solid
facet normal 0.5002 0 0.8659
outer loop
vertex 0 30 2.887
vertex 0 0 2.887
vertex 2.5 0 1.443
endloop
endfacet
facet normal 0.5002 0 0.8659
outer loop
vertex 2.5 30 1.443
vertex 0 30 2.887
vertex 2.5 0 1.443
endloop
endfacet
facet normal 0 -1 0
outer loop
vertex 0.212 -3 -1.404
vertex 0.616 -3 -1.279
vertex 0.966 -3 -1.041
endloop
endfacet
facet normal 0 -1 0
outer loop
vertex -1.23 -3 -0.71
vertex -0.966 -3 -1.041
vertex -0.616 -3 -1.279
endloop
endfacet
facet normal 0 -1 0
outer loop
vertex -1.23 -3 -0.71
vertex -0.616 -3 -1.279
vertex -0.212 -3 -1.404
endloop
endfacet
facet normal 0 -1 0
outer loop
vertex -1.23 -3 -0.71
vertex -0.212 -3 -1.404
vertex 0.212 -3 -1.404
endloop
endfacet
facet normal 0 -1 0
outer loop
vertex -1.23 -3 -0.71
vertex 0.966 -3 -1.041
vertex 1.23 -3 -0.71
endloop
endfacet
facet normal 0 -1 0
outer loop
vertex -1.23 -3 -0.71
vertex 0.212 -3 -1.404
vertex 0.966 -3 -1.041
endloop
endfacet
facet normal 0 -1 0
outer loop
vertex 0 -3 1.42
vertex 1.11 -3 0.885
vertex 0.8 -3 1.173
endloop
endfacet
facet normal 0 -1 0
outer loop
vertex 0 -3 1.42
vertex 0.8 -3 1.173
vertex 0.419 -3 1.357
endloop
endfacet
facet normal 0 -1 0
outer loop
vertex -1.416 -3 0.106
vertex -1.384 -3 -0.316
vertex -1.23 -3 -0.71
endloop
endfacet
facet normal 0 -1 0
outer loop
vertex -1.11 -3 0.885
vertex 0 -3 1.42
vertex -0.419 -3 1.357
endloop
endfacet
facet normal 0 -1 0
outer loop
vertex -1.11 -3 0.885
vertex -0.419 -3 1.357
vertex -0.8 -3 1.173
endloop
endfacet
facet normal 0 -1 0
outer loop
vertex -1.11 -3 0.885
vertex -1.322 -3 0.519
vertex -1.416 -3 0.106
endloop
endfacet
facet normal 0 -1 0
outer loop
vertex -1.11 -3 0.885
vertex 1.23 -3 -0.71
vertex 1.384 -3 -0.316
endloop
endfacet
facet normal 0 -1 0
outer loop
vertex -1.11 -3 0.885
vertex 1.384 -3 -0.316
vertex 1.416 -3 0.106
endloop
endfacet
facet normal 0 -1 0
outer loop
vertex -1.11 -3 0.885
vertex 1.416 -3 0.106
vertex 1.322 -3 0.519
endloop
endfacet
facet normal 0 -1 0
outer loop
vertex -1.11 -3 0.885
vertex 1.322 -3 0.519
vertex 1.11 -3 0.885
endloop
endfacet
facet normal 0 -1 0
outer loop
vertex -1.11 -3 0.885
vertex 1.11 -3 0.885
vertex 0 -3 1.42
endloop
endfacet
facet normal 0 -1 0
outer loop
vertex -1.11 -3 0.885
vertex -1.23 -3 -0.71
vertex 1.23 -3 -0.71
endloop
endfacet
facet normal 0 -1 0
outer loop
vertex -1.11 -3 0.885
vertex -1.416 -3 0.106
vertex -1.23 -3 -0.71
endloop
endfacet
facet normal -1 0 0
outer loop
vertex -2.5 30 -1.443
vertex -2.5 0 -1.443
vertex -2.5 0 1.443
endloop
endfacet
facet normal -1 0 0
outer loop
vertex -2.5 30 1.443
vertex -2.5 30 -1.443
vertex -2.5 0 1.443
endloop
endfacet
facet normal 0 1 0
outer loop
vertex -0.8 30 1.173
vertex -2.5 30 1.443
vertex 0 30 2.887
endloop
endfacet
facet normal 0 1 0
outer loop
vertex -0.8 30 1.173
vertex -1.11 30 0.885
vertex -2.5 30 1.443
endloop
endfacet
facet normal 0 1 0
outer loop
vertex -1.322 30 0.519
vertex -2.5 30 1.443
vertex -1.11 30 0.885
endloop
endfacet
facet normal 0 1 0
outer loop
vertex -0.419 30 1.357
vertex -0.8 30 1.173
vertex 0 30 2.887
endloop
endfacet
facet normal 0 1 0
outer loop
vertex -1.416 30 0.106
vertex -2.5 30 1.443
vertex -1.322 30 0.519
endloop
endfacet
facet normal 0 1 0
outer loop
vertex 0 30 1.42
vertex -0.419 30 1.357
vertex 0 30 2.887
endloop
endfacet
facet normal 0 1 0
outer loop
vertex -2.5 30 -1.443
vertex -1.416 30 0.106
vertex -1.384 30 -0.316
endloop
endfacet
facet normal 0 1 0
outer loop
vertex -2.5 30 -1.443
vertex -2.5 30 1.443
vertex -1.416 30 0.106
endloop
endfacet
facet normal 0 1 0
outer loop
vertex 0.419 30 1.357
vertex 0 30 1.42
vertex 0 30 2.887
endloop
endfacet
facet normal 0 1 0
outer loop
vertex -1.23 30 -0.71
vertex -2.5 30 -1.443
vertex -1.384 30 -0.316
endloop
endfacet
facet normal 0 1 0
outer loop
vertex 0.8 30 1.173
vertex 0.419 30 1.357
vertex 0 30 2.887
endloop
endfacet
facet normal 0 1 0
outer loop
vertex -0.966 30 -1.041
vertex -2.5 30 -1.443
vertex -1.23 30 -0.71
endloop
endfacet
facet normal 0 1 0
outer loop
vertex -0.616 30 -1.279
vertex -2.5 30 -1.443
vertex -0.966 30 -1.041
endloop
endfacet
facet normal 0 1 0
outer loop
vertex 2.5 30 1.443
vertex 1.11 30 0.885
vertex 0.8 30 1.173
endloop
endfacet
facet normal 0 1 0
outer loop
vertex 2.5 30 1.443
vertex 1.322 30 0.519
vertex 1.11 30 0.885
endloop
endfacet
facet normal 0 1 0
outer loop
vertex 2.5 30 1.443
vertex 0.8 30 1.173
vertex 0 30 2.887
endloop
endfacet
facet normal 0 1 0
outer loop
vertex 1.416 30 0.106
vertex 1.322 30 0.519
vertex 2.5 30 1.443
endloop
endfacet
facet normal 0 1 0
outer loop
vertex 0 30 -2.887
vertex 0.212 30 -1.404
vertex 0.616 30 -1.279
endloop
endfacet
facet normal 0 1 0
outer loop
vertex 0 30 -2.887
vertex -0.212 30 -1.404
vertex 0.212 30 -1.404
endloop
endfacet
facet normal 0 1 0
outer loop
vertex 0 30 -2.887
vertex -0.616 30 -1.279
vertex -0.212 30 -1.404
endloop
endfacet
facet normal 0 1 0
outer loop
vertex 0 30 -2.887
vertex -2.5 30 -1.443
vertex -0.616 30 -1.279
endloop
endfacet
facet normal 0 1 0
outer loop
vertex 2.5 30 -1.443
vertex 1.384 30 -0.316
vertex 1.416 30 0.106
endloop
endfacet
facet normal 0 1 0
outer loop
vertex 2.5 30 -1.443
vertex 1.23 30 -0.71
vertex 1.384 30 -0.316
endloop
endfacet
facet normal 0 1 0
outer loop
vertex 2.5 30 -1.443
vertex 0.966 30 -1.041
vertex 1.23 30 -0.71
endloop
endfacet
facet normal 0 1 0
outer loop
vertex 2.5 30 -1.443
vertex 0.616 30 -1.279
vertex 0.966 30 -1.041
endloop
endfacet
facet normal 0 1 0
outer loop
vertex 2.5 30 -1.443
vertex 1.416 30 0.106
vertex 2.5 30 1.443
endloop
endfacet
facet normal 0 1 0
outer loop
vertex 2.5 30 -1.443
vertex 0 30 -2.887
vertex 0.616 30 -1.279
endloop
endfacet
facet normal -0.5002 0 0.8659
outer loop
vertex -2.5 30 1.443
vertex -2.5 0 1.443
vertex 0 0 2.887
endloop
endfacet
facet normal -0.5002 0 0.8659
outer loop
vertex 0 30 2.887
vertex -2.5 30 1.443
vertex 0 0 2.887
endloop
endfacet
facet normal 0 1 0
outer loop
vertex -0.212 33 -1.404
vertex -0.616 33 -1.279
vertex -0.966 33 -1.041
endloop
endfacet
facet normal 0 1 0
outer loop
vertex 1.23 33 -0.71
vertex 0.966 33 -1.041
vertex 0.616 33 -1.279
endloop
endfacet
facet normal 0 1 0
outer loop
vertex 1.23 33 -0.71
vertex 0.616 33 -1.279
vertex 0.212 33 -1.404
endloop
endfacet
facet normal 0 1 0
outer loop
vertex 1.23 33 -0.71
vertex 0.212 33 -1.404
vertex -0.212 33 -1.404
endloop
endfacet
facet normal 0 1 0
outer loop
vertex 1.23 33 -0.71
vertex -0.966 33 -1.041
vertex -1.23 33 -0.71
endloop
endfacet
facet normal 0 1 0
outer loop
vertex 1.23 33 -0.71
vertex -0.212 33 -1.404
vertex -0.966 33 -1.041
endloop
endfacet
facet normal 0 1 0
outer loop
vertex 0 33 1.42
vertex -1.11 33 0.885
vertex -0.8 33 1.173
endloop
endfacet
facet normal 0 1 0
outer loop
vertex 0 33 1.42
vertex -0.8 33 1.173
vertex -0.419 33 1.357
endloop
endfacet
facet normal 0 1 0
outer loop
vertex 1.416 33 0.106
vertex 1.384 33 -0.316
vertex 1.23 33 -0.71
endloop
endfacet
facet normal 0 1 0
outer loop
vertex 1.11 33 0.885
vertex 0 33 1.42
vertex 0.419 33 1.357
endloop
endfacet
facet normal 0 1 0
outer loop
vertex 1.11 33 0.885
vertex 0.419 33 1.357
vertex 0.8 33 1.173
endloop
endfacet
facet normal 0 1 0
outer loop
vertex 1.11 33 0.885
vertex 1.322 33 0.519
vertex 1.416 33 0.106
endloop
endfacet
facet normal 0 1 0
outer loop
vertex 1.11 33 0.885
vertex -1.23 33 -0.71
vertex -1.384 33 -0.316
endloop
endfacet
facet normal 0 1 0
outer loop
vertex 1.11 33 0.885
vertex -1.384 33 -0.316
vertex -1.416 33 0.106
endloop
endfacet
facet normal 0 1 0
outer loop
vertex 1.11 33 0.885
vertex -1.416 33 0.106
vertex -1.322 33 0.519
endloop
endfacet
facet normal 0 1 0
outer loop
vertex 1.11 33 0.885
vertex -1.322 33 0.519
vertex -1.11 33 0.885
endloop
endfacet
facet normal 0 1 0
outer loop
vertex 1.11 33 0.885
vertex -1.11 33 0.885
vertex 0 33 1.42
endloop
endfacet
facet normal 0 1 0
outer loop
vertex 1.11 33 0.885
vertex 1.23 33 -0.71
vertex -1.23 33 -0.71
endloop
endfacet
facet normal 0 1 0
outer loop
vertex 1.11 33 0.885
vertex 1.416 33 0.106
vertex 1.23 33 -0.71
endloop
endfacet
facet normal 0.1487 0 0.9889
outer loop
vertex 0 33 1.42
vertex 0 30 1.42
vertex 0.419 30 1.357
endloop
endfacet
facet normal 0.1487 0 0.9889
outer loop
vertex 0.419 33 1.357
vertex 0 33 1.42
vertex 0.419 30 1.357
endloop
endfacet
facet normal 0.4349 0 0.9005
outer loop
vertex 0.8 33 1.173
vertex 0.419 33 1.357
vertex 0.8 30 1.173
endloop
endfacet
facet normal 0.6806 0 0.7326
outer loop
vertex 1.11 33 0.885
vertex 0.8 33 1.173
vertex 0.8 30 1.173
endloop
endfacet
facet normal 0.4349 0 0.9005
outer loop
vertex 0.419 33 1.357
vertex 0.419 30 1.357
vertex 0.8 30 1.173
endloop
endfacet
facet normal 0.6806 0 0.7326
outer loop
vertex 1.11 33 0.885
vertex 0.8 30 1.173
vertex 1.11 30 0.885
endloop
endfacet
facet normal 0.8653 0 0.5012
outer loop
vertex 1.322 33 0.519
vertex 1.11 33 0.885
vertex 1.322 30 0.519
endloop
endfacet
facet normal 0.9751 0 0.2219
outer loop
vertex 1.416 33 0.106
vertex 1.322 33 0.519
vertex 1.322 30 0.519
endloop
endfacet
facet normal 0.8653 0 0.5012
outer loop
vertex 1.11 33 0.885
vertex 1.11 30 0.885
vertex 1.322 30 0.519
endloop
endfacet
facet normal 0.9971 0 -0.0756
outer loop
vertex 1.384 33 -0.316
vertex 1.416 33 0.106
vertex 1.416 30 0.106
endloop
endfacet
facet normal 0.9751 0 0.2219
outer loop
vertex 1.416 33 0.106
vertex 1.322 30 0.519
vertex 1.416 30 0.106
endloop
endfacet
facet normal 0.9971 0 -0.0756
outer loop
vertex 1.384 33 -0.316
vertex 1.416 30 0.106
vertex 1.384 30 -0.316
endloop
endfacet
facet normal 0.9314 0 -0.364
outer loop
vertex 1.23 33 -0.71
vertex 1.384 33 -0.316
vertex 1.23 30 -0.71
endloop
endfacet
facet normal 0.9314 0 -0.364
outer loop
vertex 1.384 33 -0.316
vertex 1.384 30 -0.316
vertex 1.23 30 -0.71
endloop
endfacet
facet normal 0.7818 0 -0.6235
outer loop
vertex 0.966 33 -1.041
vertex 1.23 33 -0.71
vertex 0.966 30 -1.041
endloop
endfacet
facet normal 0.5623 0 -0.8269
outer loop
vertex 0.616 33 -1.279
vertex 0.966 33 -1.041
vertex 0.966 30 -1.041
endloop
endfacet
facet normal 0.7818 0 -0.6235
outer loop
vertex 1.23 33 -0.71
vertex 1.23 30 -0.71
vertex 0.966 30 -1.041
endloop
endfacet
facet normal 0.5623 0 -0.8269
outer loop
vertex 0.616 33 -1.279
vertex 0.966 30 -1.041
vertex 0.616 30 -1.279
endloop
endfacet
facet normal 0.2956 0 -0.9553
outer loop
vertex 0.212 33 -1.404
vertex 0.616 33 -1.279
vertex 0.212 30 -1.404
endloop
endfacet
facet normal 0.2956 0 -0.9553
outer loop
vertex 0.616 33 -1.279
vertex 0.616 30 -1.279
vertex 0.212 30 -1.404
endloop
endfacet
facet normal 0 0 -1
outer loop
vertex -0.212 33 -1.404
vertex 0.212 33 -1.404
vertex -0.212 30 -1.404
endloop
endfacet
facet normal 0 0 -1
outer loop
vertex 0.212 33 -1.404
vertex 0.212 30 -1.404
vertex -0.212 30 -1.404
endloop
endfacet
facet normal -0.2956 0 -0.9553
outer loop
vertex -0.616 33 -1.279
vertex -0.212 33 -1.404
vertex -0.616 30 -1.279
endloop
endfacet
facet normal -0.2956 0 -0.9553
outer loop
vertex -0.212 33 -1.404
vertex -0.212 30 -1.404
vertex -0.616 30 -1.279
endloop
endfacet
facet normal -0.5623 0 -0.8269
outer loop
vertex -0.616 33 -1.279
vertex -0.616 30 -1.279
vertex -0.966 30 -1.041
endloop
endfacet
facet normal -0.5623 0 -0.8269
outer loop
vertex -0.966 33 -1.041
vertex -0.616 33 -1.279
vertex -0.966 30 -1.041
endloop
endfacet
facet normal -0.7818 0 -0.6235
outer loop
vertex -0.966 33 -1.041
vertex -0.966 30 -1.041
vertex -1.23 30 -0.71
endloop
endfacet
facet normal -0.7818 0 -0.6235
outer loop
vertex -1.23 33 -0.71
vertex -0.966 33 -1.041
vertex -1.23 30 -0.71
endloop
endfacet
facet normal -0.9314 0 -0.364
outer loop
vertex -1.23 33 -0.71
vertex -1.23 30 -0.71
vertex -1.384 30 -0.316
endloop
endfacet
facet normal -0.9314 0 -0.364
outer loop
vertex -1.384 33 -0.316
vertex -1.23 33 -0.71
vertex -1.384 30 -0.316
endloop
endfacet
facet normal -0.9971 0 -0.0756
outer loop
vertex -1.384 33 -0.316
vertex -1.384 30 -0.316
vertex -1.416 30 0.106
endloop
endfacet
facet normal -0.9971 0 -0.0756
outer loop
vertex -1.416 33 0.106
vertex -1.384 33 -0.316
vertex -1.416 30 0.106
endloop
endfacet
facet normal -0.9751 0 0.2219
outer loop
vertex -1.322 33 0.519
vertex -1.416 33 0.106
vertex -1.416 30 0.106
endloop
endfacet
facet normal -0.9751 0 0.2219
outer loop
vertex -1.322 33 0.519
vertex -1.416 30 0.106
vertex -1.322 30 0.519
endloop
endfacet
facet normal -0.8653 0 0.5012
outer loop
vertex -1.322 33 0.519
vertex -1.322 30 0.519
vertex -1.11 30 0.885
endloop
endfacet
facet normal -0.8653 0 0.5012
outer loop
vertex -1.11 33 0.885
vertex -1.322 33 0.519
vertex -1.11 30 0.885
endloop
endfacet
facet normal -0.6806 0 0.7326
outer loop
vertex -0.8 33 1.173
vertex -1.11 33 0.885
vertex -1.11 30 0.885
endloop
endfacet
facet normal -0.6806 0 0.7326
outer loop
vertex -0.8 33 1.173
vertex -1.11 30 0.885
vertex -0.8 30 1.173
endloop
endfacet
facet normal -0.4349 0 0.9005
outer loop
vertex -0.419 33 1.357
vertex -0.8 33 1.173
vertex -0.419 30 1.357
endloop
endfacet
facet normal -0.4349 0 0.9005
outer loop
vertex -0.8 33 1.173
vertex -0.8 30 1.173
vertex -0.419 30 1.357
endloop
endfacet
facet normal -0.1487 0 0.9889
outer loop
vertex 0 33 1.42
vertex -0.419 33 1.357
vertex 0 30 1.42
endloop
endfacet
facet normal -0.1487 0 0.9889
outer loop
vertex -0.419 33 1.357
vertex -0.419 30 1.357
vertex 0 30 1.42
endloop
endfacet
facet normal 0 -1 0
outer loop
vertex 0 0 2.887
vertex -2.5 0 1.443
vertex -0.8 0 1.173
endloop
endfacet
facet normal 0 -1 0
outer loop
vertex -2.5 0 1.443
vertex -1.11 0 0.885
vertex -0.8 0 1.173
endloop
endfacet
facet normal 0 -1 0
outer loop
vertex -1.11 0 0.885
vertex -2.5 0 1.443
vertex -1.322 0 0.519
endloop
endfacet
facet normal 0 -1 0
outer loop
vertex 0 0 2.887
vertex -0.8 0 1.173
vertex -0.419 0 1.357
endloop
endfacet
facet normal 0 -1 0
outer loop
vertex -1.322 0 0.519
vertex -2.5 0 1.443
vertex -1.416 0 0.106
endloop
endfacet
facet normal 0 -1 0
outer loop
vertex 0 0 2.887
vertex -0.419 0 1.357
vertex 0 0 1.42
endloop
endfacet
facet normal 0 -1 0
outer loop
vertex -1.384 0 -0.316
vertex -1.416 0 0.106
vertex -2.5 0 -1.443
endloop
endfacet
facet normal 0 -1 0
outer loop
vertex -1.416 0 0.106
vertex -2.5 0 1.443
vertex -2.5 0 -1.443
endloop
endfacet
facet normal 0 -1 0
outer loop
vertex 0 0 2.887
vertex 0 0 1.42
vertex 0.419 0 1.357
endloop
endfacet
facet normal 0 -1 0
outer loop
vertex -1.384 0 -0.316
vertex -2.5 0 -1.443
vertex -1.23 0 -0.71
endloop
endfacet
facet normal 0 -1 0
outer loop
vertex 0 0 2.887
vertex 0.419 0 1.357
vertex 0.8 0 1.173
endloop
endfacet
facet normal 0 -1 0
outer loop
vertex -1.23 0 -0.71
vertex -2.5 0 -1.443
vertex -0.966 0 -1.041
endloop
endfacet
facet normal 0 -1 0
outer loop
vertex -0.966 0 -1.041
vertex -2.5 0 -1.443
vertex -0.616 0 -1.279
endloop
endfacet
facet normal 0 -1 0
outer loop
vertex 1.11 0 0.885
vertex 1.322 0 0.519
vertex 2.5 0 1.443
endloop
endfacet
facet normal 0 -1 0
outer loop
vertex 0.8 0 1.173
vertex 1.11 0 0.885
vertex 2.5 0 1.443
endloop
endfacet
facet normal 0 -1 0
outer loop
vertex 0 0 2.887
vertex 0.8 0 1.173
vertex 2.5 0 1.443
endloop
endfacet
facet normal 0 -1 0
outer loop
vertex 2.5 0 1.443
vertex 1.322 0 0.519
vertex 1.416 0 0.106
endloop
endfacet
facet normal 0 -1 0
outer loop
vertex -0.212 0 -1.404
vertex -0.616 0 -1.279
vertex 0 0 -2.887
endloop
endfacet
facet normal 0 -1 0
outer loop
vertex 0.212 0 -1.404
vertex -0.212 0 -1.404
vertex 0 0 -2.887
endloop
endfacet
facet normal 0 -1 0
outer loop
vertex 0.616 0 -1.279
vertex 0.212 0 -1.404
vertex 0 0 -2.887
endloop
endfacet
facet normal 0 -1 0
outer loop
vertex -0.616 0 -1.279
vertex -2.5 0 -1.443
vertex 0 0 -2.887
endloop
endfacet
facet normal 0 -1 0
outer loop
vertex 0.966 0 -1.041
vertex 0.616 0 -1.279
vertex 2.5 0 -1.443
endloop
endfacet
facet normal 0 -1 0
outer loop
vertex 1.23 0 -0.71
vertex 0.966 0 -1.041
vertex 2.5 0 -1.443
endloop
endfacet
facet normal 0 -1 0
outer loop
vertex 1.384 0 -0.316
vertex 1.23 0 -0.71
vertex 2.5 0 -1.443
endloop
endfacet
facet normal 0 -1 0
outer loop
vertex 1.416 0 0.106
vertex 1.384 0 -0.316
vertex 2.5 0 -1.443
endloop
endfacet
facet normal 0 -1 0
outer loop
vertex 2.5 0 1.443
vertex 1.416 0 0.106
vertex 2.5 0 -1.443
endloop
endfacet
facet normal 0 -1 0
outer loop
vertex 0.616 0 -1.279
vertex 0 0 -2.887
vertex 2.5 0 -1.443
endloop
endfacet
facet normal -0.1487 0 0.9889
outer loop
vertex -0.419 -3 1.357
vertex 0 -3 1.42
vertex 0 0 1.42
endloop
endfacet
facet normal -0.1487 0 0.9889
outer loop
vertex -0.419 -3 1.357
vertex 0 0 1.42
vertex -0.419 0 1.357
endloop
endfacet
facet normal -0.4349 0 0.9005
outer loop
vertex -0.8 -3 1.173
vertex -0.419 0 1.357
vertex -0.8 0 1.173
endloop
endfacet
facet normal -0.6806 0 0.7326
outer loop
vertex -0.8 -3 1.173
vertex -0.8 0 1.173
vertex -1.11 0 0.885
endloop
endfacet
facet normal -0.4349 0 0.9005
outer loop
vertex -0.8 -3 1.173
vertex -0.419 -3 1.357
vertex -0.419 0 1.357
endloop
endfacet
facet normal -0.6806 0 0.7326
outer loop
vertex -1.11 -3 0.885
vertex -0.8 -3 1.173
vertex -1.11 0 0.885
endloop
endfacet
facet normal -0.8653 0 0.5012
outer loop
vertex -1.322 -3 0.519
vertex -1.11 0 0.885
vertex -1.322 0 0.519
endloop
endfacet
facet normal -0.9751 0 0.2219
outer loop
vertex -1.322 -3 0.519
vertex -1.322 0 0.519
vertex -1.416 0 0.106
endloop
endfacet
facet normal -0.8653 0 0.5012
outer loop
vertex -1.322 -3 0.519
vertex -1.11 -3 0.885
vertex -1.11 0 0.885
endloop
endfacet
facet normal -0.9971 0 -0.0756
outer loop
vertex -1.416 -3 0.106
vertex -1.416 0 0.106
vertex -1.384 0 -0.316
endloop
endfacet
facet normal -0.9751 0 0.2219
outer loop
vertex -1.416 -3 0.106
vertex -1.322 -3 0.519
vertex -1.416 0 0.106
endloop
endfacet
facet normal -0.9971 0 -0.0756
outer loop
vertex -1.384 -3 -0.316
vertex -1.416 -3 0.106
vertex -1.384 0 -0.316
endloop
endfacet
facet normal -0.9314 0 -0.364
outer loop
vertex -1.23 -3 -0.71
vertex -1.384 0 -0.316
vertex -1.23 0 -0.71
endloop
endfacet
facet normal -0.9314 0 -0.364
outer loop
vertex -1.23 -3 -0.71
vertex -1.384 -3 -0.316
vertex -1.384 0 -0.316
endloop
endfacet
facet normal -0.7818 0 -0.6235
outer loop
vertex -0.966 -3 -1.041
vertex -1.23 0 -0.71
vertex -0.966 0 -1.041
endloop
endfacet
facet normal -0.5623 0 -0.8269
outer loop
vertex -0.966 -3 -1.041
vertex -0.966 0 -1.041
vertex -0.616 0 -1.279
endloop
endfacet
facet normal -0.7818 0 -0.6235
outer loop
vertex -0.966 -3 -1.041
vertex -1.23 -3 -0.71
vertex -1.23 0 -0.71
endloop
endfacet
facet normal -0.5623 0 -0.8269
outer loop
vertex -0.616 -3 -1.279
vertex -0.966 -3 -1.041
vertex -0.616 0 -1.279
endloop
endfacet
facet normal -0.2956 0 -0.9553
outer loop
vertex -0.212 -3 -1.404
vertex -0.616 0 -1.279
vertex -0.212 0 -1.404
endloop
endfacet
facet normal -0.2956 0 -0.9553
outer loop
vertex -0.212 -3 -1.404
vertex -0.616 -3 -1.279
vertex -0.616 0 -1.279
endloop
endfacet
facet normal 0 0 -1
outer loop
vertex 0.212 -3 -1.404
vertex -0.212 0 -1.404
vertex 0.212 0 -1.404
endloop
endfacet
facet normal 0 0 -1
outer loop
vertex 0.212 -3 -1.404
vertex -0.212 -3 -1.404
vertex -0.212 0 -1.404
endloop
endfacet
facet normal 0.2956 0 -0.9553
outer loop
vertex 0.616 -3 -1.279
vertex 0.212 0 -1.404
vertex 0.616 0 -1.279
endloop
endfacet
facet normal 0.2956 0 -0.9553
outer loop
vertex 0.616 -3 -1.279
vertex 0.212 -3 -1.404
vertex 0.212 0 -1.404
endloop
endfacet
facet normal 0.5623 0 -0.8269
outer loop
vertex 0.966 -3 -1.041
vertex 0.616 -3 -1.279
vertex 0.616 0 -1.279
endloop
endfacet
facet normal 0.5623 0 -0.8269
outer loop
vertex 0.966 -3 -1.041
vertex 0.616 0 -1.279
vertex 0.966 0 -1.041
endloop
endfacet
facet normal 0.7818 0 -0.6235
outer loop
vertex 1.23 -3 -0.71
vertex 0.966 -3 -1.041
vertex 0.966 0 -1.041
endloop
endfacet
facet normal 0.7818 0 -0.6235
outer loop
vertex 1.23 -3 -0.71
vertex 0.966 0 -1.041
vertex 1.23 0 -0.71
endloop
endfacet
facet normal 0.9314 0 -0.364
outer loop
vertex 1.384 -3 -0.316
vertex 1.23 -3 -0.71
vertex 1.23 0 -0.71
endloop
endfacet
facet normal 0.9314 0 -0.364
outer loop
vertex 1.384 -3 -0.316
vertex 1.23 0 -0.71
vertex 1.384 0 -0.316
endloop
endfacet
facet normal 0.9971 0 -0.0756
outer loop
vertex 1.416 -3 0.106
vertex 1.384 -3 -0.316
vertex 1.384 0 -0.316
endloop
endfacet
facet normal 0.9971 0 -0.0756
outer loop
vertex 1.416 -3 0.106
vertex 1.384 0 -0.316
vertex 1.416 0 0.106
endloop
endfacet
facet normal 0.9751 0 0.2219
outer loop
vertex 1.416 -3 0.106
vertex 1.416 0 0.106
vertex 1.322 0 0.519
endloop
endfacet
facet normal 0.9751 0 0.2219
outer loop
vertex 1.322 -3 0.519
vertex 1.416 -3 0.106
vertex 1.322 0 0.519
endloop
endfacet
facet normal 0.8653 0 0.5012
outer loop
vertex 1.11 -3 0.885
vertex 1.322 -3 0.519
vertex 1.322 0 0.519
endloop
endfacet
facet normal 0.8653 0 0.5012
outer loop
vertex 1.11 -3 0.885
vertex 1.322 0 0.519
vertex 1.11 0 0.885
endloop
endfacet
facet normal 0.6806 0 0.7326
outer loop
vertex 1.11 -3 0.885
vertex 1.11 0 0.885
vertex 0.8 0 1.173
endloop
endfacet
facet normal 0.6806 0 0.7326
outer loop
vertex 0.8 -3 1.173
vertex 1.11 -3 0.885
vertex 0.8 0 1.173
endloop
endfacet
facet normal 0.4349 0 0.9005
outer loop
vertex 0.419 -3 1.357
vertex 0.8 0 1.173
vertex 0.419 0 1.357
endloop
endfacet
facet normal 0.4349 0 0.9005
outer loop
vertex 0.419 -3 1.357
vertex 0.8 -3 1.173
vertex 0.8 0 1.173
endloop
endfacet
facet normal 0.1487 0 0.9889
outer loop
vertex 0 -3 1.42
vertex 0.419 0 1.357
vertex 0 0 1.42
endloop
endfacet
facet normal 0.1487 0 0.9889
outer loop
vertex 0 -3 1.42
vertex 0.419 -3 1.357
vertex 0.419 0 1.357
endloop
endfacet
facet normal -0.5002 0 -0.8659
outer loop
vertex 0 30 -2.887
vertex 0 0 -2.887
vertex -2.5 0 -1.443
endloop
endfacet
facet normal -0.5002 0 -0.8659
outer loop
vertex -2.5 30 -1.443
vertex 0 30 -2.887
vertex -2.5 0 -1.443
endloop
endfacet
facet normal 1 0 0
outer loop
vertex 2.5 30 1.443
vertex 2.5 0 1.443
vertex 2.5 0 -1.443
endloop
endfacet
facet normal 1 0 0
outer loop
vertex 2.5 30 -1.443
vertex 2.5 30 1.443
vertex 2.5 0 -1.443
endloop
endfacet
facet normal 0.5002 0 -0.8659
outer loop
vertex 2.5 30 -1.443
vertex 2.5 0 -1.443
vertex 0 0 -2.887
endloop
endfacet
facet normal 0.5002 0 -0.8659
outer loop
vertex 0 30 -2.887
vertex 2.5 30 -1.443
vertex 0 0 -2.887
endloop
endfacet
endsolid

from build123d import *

# Parameters (mm, degrees)
BOSS_EXTRUDE1_DEPTH = 30
SKETCH3_R           = 1.42
BOSS_EXTRUDE2_DEPTH = 3
BOSS_EXTRUDE3_START = 3
SKETCH4_R           = 1.42
BOSS_EXTRUDE3_DEPTH = 3


with BuildPart() as part:
    # Sketch2 → Boss-Extrude1 (new body)
    with BuildSketch(Plane(origin=(0, 0, 0), x_dir=(1, 0, 0), z_dir=(0, 1, 0))):
        Polygon((0, 2.886751346), (-2.5, 1.443375673), (-2.5, -1.443375673), (0, -2.886751346), (2.5, -1.443375673), (2.5, 1.443375673), align=None)
    extrude(amount=BOSS_EXTRUDE1_DEPTH)

    # Sketch3 → Boss-Extrude2 (add)
    with BuildSketch(Plane(origin=(0, 30, 0), x_dir=(1, 0, 0), z_dir=(0, 1, 0))):
        with Locations(Location((0, 0, 0), (0, 0, 270))):
            Circle(SKETCH3_R)
    extrude(amount=BOSS_EXTRUDE2_DEPTH)

    # Sketch4 → Boss-Extrude3 (add)
    with BuildSketch(Plane(origin=(0, 0, 0), x_dir=(-1, 0, 0), z_dir=(0, -1, 0)).offset(BOSS_EXTRUDE3_START)):
        with Locations(Location((0, 0, 0), (0, 0, 270))):
            Circle(SKETCH4_R)
    extrude(amount=-BOSS_EXTRUDE3_DEPTH)


solid = part.part
